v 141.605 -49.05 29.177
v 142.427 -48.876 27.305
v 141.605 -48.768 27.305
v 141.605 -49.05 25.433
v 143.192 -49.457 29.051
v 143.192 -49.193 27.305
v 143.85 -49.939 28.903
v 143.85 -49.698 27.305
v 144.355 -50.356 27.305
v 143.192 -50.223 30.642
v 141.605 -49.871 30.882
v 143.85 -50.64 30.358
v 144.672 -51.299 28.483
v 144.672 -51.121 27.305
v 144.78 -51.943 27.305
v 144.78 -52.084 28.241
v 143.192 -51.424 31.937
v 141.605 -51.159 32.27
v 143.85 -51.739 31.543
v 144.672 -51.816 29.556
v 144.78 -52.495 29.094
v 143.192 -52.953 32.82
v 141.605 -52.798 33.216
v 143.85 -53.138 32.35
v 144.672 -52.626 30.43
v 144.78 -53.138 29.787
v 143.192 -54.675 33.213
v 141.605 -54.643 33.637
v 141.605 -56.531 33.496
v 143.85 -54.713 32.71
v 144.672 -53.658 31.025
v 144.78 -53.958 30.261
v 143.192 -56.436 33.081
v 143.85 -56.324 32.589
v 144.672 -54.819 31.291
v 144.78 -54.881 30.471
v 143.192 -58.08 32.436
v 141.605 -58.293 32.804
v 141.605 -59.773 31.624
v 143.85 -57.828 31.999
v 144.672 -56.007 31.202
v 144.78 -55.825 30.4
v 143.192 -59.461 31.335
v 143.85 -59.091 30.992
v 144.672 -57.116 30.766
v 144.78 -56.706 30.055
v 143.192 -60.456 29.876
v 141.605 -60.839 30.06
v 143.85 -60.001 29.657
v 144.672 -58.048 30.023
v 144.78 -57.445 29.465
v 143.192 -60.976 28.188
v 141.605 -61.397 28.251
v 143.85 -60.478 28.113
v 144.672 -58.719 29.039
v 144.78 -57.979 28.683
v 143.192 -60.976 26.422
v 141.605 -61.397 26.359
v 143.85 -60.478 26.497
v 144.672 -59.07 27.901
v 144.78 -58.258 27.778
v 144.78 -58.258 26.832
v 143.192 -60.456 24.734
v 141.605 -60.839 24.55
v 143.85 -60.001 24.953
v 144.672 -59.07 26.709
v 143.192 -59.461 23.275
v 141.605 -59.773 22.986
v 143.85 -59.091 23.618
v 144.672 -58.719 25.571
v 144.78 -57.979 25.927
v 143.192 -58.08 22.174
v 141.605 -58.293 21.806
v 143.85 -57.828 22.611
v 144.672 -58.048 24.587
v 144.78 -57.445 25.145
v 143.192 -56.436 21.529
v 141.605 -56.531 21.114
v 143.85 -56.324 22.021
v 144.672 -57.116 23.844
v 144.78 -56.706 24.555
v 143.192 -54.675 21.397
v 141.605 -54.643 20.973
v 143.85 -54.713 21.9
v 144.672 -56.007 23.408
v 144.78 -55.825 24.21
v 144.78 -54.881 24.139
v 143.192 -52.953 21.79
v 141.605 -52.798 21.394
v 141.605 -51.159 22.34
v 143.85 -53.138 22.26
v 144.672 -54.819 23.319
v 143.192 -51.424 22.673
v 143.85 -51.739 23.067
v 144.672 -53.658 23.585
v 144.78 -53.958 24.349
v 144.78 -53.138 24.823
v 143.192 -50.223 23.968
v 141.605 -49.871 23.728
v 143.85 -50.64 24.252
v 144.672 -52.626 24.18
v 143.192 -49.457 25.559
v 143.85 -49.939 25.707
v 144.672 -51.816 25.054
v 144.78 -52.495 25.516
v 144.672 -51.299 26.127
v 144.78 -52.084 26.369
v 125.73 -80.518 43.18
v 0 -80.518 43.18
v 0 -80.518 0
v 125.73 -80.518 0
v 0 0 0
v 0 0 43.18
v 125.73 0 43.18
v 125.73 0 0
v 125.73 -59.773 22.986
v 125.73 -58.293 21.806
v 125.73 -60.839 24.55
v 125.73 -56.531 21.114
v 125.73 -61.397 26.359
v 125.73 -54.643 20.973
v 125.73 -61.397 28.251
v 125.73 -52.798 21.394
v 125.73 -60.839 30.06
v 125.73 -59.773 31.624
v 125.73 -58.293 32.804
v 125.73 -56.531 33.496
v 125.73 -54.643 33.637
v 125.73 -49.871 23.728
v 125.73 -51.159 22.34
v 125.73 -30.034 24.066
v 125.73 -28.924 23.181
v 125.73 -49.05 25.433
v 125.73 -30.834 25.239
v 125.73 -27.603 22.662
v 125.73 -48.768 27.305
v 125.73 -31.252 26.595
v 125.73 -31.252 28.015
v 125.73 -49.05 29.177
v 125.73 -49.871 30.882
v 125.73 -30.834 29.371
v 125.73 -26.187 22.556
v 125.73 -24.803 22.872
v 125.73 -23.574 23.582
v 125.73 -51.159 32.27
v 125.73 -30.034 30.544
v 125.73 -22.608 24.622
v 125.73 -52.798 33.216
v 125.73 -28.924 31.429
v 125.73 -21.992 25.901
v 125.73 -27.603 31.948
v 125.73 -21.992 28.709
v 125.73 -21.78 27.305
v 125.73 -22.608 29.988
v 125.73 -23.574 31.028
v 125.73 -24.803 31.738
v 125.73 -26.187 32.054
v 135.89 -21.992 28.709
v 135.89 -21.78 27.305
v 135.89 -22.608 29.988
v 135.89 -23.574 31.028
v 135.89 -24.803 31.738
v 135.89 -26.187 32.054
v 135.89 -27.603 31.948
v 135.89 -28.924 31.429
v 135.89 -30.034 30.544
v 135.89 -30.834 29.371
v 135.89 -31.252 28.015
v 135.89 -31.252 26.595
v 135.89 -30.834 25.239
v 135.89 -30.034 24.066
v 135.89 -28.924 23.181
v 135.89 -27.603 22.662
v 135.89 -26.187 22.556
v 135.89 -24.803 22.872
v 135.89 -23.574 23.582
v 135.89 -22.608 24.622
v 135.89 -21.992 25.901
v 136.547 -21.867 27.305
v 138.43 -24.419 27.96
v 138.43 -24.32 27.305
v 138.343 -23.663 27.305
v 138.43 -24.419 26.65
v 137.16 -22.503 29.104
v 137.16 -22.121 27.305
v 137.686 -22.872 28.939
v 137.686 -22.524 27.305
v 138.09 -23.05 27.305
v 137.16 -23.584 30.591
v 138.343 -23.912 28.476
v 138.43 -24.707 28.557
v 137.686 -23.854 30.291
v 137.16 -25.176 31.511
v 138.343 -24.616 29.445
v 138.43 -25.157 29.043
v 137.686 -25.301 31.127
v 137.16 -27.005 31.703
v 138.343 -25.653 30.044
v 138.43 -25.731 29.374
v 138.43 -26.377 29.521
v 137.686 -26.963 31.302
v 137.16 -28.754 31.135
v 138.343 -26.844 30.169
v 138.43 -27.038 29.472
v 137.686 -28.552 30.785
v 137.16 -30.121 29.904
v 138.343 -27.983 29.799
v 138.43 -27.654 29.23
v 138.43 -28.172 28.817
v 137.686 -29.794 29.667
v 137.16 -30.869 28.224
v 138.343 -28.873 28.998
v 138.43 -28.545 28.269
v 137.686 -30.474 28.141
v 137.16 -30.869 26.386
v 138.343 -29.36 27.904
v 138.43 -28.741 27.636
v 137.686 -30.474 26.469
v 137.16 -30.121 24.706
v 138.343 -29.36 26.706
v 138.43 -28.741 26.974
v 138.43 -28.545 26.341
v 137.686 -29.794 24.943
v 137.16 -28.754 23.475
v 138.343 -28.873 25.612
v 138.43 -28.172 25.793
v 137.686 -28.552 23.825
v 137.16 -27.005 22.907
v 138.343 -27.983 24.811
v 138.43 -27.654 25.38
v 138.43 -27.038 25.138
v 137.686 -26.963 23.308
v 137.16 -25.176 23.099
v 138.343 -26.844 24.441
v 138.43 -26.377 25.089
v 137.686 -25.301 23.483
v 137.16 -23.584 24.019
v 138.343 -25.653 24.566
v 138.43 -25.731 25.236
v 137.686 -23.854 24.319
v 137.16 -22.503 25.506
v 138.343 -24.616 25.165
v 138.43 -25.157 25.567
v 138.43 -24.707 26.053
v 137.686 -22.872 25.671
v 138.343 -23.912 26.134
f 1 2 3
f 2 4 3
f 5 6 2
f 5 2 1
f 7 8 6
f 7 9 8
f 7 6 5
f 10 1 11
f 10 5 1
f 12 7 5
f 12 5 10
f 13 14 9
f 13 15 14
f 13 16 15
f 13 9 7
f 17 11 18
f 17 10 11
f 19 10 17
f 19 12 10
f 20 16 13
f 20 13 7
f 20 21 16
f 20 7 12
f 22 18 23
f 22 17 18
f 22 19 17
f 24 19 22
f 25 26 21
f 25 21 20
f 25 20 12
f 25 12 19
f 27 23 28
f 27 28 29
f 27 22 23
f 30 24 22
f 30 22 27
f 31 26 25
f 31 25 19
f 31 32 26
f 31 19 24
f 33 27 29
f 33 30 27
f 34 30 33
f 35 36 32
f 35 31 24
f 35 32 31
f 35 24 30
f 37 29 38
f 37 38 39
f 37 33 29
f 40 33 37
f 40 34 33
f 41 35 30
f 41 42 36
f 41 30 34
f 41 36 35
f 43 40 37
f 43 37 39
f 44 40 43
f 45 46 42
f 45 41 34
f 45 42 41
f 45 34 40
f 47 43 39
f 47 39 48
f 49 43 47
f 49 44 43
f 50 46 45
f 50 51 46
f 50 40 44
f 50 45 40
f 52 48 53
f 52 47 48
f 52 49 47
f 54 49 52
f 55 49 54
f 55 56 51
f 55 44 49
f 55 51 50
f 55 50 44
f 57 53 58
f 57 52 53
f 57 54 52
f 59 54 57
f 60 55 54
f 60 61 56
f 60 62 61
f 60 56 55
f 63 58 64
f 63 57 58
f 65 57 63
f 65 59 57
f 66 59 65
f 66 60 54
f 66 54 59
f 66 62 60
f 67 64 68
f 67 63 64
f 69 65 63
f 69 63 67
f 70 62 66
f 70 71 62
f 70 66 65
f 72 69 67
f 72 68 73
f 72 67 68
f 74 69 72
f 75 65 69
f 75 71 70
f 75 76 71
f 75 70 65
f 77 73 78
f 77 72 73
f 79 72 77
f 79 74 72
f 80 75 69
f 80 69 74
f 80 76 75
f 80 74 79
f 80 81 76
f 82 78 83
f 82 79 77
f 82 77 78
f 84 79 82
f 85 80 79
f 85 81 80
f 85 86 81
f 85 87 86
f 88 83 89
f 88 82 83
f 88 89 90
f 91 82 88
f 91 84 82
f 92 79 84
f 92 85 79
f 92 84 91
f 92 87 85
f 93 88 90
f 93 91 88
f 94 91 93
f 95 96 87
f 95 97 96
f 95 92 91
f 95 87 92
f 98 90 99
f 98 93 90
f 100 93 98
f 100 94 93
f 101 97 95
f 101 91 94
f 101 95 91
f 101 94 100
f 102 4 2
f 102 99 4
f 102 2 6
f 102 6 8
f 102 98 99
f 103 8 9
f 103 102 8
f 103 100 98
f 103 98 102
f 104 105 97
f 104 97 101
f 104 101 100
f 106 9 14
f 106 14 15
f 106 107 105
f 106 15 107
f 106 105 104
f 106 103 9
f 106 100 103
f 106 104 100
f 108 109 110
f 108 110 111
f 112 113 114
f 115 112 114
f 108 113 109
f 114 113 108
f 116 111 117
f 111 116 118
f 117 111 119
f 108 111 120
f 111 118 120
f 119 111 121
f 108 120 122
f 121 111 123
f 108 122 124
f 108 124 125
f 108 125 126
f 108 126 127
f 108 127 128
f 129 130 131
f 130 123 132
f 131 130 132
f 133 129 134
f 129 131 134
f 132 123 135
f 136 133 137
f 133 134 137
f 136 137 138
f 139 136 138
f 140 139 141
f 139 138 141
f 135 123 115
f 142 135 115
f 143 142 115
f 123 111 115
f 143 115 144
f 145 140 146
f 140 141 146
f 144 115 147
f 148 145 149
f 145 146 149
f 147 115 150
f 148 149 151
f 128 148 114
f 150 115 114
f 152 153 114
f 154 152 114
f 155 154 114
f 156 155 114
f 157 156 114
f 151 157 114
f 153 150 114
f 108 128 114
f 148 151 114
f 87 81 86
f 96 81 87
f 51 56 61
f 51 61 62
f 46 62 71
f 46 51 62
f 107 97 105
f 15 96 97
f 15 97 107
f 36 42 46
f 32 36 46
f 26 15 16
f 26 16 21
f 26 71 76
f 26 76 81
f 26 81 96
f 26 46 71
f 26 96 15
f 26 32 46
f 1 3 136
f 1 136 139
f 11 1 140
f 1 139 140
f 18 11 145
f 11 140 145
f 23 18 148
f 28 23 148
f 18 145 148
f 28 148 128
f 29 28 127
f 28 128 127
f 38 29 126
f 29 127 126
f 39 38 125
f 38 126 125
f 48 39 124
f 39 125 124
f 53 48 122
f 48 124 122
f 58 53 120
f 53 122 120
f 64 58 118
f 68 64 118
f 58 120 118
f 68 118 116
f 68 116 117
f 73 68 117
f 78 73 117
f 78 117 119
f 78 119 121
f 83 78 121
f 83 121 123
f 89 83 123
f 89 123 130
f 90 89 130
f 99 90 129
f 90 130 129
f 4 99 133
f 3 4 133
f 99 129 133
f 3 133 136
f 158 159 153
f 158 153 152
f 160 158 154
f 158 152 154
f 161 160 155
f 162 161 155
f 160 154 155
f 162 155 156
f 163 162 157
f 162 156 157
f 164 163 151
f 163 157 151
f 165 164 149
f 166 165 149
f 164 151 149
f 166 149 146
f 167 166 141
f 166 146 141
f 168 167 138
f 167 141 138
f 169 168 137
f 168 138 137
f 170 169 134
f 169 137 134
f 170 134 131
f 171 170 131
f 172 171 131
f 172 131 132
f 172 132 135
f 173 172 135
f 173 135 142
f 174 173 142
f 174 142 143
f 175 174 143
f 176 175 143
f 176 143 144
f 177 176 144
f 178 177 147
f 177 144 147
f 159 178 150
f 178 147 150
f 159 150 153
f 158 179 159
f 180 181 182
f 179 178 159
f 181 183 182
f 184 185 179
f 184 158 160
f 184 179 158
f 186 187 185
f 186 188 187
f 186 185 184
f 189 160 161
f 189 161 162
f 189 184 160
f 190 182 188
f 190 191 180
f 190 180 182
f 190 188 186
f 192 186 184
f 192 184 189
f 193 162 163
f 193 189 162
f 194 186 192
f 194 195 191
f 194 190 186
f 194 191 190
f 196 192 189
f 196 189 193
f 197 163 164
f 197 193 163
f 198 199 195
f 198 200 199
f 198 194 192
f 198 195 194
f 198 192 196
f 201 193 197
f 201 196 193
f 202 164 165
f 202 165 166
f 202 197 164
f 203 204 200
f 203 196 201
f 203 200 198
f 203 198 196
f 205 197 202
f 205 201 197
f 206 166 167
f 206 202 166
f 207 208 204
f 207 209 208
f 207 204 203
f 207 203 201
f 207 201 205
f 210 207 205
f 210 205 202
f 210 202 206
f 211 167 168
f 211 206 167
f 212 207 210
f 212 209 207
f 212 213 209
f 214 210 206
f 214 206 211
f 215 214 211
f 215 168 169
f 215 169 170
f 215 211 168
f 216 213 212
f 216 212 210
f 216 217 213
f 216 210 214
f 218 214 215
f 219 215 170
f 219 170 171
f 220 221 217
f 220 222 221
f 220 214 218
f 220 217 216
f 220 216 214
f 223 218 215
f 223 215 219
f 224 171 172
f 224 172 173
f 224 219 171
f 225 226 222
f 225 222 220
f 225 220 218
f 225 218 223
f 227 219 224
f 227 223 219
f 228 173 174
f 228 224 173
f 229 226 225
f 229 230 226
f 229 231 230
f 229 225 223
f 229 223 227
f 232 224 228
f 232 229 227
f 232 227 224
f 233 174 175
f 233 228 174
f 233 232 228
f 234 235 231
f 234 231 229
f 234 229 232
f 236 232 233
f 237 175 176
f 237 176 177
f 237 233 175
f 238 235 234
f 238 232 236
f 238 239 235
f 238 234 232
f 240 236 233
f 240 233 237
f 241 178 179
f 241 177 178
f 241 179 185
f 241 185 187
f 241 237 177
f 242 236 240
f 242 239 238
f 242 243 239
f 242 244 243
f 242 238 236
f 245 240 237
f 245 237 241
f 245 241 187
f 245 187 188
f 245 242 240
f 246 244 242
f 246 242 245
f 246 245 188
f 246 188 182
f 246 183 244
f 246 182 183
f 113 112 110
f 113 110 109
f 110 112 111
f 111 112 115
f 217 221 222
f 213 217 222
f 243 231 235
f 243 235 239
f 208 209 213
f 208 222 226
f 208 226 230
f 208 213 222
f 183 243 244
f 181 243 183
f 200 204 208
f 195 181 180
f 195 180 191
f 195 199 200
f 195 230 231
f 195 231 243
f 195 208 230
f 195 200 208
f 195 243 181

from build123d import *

# Parameters (mm, degrees)
F0_W     = 125.73
F0_H     = 43.18
F1_DEPTH = 80.518
F2_R     = 6.35
F3_DEPTH = 19.05
F2_R_2   = 4.7625
F4_DEPTH = 12.7
F5_R     = 3.175
F6_R     = 2.54


with BuildPart() as f1:
    # F0 (on Front) → F1 (new body)
    with BuildSketch(Plane.XZ):
        with Locations((62.865, 21.59)):
            Rectangle(F0_W, F0_H)
    extrude(amount=F1_DEPTH)

    # F2 (on face) → F3 (join)
    with BuildSketch(Plane.YZ.offset(125.73)):
        with Locations((-55.118, 27.305)):
            Circle(F2_R)
    extrude(amount=F3_DEPTH)

    # F2 (on face) → F4 (join)
    with BuildSketch(Plane.YZ.offset(125.73)):
        with Locations((-26.543, 27.305)):
            Circle(F2_R_2)
    extrude(amount=F4_DEPTH)

    # F5
    f5_edges = [f1.edges().sort_by_distance(p)[0] for p in [
        (144.78, -61.468, 27.305),
    ]]
    fillet(f5_edges, radius=F5_R)

    # F6
    f6_edges = [f1.edges().sort_by_distance(p)[0] for p in [
        (138.43, -31.3055, 27.305),
    ]]
    fillet(f6_edges, radius=F6_R)


solid = f1.part
